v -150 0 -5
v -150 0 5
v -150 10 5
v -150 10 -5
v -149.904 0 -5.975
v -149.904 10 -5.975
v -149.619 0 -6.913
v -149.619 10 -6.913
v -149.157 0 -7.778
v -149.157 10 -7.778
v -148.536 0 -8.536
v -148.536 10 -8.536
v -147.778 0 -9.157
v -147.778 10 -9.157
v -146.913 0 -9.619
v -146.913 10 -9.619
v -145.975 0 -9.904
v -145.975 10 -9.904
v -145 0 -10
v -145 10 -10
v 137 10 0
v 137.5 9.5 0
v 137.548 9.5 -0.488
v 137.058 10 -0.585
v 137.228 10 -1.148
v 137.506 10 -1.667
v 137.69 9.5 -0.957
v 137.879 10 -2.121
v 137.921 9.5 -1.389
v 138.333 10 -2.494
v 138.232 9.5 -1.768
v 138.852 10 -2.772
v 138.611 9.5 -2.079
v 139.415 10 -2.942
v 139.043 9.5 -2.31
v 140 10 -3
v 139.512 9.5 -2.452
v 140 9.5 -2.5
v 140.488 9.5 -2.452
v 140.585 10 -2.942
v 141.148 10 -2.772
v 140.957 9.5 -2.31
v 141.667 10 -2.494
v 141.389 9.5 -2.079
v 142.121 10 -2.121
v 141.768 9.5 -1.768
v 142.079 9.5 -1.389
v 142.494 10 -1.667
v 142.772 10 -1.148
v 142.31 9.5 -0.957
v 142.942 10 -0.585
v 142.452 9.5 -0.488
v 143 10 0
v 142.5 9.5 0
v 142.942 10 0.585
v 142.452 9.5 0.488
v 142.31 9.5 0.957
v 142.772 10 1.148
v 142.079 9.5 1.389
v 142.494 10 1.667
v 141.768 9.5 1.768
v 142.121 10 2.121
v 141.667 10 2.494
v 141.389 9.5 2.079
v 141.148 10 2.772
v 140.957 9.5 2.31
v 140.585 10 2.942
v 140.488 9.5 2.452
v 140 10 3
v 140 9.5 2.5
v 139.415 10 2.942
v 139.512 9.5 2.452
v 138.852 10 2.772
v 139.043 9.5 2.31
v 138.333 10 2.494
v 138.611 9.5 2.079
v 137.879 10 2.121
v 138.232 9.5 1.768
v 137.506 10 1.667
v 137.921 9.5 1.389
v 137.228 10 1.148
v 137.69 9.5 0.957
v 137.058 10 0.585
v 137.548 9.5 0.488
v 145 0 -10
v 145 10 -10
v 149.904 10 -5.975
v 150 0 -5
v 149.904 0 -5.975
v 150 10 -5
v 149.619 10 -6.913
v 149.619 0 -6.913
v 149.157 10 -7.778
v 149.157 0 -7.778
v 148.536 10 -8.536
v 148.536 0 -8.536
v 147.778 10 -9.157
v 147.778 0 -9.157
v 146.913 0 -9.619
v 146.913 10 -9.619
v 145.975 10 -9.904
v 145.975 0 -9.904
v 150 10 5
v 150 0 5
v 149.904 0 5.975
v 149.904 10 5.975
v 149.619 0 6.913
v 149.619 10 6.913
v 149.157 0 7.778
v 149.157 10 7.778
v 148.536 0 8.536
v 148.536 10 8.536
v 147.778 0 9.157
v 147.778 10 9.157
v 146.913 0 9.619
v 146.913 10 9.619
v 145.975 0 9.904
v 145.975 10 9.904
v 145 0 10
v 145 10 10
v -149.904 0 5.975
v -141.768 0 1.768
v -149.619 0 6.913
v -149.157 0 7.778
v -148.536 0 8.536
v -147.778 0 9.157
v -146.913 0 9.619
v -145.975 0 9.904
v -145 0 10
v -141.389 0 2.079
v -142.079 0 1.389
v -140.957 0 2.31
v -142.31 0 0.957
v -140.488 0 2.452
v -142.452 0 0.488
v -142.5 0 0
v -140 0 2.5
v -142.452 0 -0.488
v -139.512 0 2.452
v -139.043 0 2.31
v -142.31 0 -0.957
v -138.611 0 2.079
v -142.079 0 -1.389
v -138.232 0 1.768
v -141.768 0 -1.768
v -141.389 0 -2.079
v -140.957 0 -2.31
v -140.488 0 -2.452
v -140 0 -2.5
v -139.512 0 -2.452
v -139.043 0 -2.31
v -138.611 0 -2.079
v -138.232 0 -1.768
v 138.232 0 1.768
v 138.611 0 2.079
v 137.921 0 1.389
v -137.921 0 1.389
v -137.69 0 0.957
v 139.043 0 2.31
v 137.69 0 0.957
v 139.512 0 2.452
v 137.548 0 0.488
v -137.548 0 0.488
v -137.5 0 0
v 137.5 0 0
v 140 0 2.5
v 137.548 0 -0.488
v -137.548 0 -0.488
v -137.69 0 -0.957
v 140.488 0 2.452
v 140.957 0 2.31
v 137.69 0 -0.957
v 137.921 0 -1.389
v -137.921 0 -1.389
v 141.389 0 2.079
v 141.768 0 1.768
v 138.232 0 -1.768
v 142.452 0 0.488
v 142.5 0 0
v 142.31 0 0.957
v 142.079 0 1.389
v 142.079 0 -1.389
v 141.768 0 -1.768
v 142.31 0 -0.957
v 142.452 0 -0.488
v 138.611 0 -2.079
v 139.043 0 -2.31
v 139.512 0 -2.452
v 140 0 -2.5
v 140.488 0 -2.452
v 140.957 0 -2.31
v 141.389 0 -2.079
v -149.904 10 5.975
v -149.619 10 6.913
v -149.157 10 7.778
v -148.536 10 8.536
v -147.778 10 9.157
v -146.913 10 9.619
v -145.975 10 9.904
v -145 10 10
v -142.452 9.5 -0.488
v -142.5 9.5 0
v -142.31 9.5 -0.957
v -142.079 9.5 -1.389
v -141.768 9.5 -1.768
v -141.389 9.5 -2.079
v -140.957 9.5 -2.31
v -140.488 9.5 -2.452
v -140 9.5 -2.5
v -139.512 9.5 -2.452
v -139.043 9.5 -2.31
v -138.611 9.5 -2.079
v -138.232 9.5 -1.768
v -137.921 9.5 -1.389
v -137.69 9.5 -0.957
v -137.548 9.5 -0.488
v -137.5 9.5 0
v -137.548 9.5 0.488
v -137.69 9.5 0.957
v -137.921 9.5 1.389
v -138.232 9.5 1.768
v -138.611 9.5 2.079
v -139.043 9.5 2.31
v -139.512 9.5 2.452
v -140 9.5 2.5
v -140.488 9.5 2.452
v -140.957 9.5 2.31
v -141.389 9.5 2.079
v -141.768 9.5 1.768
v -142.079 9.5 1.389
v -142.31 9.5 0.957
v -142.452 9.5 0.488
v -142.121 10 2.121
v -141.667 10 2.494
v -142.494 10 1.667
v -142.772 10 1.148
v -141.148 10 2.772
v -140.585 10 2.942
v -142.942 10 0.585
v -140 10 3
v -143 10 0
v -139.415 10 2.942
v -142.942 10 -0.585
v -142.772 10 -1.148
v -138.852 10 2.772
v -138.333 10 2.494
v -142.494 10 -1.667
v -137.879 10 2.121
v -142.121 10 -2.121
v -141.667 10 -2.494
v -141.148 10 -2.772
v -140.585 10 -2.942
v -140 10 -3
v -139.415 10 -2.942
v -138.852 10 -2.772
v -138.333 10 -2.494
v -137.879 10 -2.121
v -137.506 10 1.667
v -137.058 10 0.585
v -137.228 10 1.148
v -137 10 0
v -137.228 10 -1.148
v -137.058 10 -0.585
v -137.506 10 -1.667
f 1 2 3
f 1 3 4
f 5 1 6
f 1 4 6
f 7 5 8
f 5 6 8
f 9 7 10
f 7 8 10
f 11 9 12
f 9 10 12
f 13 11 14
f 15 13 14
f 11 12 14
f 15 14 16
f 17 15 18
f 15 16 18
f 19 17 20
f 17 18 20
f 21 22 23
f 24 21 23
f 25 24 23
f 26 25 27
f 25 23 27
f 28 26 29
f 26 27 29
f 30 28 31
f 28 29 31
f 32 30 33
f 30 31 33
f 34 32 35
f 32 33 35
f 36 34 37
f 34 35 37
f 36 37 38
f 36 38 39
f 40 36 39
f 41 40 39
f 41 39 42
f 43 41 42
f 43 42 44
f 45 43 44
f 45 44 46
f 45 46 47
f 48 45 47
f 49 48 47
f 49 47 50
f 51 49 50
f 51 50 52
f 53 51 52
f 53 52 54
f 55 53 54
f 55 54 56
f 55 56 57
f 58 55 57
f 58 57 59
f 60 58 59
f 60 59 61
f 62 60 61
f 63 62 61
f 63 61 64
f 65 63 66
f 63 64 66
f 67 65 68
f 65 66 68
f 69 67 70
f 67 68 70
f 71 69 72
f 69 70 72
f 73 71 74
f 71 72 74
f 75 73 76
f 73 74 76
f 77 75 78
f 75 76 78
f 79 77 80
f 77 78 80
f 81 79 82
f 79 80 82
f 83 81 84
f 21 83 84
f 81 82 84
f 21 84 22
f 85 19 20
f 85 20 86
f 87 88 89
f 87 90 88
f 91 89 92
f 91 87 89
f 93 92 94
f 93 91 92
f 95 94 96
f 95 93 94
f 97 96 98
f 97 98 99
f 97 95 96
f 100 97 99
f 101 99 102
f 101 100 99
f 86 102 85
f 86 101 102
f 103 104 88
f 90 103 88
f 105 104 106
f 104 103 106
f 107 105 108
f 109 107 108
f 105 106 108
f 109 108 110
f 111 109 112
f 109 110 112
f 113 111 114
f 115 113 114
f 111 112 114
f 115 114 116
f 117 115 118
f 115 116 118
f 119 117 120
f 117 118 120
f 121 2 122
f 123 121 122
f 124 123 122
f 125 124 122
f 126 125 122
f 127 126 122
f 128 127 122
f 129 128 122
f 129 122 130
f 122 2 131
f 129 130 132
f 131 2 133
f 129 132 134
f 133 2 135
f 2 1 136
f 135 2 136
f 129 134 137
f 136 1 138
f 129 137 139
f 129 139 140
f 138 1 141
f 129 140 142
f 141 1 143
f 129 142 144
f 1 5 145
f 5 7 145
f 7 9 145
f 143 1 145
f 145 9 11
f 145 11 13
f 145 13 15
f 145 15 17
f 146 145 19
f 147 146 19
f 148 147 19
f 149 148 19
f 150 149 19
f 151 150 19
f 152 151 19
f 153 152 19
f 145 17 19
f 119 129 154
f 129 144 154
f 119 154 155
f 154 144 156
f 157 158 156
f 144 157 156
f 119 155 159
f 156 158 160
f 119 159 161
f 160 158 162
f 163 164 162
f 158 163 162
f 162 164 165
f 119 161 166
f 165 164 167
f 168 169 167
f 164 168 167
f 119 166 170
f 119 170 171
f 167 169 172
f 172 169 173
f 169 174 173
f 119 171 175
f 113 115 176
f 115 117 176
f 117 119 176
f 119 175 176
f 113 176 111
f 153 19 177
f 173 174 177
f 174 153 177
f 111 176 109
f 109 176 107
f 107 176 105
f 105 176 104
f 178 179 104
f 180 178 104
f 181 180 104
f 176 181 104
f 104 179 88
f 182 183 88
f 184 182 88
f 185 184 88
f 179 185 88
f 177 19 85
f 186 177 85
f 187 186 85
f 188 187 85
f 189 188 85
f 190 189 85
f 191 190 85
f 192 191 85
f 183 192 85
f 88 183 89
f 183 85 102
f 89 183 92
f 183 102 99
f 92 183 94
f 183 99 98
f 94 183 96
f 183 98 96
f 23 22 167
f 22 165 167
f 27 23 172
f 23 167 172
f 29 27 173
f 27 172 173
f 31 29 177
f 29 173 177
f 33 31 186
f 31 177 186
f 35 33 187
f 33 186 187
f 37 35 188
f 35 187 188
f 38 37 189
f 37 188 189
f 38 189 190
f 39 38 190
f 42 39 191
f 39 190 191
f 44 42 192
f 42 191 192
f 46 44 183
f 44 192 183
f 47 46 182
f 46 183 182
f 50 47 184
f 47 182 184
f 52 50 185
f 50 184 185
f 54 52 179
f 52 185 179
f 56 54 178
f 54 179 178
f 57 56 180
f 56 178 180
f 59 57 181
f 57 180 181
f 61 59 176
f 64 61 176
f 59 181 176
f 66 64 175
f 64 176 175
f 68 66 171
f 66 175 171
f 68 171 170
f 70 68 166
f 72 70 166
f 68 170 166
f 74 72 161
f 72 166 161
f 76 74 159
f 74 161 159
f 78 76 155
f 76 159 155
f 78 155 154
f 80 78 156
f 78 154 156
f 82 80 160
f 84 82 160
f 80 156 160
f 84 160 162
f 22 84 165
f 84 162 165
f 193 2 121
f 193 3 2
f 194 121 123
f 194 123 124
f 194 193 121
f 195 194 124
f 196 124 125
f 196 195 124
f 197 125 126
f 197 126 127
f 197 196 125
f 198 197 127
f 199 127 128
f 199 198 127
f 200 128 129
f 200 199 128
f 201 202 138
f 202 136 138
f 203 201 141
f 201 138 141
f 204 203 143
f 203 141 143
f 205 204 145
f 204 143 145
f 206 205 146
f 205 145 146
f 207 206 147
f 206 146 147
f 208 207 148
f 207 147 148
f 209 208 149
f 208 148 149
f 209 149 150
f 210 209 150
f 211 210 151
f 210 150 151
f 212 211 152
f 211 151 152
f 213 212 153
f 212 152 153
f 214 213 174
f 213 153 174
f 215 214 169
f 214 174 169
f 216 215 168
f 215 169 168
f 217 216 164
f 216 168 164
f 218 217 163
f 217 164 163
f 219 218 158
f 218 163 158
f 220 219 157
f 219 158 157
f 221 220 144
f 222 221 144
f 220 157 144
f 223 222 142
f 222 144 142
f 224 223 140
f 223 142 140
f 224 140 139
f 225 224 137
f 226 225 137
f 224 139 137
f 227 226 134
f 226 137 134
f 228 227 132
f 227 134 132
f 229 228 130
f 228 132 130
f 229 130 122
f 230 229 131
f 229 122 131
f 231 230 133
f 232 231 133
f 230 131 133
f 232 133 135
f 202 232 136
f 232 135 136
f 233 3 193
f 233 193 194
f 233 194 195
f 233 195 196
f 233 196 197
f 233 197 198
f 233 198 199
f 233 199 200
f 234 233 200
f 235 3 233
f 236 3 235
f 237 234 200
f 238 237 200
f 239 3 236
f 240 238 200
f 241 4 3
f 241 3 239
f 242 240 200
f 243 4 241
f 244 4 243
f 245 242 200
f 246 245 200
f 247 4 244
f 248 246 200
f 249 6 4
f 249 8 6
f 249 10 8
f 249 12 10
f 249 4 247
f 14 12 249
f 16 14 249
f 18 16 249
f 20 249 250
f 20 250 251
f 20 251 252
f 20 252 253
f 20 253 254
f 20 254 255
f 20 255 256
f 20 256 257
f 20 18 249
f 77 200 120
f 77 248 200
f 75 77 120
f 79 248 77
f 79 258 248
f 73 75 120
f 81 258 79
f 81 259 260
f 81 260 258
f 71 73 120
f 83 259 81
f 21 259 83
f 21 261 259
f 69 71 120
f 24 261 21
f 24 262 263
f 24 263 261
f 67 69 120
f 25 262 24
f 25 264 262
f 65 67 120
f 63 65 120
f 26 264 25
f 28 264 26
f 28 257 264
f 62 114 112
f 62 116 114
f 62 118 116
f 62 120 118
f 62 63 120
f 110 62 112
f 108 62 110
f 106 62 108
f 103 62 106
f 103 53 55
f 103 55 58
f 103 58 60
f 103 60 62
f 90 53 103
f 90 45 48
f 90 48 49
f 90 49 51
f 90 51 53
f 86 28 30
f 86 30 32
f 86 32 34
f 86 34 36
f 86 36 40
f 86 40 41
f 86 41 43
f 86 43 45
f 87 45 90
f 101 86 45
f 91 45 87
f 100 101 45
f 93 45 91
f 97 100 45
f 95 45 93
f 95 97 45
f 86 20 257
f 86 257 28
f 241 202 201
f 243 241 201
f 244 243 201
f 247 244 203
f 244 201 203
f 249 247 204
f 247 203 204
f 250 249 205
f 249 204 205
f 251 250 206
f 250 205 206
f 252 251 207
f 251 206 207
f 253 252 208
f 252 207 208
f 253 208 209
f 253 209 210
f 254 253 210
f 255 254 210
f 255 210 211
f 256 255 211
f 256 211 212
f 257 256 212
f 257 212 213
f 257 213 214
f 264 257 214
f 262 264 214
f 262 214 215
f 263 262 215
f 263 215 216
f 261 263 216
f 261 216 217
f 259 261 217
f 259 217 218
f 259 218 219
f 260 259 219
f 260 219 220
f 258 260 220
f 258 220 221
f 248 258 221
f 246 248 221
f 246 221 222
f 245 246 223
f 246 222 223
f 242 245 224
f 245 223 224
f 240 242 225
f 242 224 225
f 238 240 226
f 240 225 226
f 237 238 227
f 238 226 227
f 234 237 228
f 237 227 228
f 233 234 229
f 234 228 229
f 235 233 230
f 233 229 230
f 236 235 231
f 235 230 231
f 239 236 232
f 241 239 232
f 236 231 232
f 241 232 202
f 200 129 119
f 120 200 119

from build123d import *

# Parameters (mm, degrees)
SCHIZZO1_W                      = 300
SCHIZZO1_H                      = 20
ESTRUSIONE_ESTRUSIONE1_DEPTH    = 10
FORO_FILETTATO_M6_5_D           = 5
FORO_FILETTATO_M6_5_CSINK_D     = 6
FORO_FILETTATO_M6_5_CSINK_ANGLE = 90
RACCORDO1_R                     = 5


with BuildPart() as part:
    # Schizzo1 → Estrusione-Estrusione1 (new body)
    with BuildSketch(Plane(origin=(0, 0, 0), x_dir=(1, 0, 0), z_dir=(0, 1, 0))):
        Rectangle(SCHIZZO1_W, SCHIZZO1_H)
    extrude(amount=ESTRUSIONE_ESTRUSIONE1_DEPTH)

    # Foro filettato M6-5 (through all)
    with Locations(Plane(origin=(0, 10, 0), x_dir=(1, 0, 0), z_dir=(0, 1, 0))):
        with Locations((-140, 0), (140, 0)):
            CounterSinkHole(FORO_FILETTATO_M6_5_D / 2, FORO_FILETTATO_M6_5_CSINK_D / 2, counter_sink_angle=FORO_FILETTATO_M6_5_CSINK_ANGLE)

    # Raccordo1
    raccordo1_edges = [part.edges().sort_by_distance(p)[0] for p in [
        (150, 5, 10),
        (-150, 5, 10),
        (-150, 5, -10),
        (150, 5, -10),
    ]]
    fillet(raccordo1_edges, radius=RACCORDO1_R)


solid = part.part
